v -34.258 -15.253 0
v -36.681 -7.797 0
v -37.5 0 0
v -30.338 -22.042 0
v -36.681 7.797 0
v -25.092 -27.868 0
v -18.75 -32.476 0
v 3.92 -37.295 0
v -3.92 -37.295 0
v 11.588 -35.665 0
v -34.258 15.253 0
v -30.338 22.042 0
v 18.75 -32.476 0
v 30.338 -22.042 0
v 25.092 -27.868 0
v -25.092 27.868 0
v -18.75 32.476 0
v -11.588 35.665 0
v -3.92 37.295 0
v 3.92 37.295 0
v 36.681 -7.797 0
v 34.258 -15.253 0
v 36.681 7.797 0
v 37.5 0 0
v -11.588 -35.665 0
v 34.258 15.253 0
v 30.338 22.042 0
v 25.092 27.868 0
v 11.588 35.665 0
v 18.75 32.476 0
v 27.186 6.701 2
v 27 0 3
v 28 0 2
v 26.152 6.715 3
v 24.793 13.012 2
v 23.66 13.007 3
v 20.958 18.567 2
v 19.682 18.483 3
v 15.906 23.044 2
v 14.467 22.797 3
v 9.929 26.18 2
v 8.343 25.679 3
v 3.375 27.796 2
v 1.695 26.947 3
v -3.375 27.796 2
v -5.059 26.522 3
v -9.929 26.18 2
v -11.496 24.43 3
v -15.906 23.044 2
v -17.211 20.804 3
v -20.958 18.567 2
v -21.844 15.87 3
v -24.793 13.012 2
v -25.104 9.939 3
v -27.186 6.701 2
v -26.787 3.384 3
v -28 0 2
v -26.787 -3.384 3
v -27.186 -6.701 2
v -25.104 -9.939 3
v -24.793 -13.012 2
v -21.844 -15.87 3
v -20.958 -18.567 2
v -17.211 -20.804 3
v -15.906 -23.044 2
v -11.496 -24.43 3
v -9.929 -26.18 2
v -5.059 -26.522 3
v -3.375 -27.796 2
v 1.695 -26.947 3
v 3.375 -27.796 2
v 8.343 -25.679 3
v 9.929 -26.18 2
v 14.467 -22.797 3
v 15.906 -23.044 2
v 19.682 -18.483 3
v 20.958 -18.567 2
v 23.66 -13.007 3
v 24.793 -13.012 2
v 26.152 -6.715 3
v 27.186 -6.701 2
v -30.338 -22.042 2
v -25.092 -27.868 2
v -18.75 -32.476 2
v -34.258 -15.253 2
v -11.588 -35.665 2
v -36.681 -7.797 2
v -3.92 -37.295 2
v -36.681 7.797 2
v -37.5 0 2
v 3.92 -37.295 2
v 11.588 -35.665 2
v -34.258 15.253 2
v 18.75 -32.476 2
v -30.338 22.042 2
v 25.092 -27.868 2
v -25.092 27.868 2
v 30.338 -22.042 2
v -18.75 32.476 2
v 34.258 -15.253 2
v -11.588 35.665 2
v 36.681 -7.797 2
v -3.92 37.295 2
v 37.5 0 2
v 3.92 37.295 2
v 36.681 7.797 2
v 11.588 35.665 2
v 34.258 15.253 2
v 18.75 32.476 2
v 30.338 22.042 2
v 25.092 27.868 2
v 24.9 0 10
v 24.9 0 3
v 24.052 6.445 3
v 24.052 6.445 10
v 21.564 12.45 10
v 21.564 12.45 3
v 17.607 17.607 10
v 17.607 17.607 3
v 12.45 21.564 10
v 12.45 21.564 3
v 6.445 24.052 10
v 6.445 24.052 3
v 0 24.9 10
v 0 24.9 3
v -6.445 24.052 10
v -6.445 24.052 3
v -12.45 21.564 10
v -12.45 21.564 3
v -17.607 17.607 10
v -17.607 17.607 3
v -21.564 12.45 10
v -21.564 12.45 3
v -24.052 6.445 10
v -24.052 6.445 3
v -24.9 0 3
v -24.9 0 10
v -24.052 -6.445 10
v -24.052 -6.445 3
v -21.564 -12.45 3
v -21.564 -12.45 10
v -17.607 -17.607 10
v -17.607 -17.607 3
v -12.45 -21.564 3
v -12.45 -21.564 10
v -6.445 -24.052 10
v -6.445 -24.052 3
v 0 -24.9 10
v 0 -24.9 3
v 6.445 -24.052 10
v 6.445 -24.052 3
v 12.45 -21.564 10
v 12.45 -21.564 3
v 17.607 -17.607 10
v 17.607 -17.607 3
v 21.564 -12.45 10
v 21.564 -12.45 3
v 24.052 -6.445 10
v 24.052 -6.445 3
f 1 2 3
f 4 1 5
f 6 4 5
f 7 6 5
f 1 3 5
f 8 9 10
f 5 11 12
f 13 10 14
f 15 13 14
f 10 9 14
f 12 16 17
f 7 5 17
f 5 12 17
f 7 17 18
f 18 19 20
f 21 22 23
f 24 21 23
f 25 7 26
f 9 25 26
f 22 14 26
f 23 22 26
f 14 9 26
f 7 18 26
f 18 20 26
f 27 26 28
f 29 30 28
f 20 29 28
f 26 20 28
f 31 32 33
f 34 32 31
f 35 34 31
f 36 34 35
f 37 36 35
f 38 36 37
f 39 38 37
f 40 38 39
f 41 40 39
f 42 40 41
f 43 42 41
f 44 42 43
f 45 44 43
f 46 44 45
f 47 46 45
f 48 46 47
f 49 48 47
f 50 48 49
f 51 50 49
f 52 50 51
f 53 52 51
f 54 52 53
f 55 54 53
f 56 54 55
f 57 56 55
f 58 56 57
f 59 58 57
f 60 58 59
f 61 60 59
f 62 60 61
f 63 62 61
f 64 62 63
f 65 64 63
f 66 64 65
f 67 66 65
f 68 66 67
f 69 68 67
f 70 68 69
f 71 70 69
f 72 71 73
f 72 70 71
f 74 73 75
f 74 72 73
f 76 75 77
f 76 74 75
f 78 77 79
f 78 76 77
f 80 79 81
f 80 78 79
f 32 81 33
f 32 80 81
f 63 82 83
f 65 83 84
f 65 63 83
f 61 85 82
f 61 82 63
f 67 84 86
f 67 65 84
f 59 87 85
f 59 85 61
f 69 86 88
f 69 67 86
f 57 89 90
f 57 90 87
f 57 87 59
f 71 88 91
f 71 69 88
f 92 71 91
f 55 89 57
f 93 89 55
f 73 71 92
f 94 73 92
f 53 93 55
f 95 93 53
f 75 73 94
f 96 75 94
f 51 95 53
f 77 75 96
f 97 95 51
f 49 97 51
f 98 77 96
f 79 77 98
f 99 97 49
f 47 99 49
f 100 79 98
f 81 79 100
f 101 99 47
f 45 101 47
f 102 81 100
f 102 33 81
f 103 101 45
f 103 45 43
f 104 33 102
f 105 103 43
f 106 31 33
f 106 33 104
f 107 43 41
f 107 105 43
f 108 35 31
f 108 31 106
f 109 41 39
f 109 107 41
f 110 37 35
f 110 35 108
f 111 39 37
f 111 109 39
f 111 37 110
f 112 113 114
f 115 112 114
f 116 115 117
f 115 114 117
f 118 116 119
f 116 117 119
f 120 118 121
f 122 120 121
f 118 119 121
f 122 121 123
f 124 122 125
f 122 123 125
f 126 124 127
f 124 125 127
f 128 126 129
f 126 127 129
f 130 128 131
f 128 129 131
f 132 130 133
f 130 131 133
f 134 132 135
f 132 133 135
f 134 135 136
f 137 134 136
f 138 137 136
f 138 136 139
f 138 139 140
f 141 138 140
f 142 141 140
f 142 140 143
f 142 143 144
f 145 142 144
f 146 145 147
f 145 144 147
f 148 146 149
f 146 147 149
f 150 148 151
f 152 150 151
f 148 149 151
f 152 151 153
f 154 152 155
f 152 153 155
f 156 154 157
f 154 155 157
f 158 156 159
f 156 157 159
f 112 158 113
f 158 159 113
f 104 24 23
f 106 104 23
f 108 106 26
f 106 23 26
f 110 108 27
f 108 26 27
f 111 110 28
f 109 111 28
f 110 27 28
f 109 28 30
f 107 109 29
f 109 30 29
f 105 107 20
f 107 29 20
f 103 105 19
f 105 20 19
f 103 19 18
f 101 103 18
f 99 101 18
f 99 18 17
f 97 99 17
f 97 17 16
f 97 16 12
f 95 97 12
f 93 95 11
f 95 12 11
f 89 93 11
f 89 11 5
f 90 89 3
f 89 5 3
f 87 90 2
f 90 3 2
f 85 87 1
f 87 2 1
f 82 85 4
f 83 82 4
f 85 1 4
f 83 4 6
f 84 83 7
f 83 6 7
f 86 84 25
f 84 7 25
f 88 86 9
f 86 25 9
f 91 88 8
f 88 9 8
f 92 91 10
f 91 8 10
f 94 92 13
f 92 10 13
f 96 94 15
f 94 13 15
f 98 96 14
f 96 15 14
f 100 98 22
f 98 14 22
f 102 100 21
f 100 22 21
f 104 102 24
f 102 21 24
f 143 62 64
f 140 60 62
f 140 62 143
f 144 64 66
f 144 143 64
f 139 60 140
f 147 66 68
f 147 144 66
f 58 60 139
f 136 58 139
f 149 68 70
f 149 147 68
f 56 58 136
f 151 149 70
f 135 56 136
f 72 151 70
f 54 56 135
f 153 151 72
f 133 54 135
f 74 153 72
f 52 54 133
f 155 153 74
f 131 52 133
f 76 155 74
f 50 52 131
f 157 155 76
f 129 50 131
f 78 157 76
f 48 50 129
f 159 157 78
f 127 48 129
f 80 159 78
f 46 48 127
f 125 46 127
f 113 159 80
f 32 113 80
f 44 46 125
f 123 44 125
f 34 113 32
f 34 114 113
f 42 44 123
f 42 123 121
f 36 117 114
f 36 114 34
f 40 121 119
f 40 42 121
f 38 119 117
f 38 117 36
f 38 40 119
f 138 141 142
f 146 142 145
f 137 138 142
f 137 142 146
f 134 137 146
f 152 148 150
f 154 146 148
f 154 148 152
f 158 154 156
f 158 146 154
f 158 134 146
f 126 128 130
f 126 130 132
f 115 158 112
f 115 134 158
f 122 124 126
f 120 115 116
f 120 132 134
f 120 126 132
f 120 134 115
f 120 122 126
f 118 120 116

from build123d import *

# Parameters (mm, degrees)
SKETCH1_R           = 37.5
BOSS_EXTRUDE1_DEPTH = 2
SKETCH5_R           = 28
BOSS_EXTRUDE5_DEPTH = 1
SKETCH2_R           = 24.9
BOSS_EXTRUDE2_DEPTH = 7
CHAMFER1_SIZE       = 1


with BuildPart() as part:
    # Sketch1 → Boss-Extrude1 (new body)
    with BuildSketch(Plane.XY):
        Circle(SKETCH1_R)
    extrude(amount=BOSS_EXTRUDE1_DEPTH)

    # Sketch5 → Boss-Extrude5 (add)
    with BuildSketch(Plane.XY.offset(2)):
        Circle(SKETCH5_R)
    extrude(amount=BOSS_EXTRUDE5_DEPTH)

    # Sketch2 → Boss-Extrude2 (add)
    with BuildSketch(Plane.XY.offset(3)):
        Circle(SKETCH2_R)
    extrude(amount=BOSS_EXTRUDE2_DEPTH)

    # Chamfer1
    chamfer1_edges = [part.edges().sort_by_distance(p)[0] for p in [
        (-28, 0, 3),
    ]]
    chamfer(chamfer1_edges, length=CHAMFER1_SIZE - 0.0001)  # a hair under: the kernel refuses the full size


solid = part.part
